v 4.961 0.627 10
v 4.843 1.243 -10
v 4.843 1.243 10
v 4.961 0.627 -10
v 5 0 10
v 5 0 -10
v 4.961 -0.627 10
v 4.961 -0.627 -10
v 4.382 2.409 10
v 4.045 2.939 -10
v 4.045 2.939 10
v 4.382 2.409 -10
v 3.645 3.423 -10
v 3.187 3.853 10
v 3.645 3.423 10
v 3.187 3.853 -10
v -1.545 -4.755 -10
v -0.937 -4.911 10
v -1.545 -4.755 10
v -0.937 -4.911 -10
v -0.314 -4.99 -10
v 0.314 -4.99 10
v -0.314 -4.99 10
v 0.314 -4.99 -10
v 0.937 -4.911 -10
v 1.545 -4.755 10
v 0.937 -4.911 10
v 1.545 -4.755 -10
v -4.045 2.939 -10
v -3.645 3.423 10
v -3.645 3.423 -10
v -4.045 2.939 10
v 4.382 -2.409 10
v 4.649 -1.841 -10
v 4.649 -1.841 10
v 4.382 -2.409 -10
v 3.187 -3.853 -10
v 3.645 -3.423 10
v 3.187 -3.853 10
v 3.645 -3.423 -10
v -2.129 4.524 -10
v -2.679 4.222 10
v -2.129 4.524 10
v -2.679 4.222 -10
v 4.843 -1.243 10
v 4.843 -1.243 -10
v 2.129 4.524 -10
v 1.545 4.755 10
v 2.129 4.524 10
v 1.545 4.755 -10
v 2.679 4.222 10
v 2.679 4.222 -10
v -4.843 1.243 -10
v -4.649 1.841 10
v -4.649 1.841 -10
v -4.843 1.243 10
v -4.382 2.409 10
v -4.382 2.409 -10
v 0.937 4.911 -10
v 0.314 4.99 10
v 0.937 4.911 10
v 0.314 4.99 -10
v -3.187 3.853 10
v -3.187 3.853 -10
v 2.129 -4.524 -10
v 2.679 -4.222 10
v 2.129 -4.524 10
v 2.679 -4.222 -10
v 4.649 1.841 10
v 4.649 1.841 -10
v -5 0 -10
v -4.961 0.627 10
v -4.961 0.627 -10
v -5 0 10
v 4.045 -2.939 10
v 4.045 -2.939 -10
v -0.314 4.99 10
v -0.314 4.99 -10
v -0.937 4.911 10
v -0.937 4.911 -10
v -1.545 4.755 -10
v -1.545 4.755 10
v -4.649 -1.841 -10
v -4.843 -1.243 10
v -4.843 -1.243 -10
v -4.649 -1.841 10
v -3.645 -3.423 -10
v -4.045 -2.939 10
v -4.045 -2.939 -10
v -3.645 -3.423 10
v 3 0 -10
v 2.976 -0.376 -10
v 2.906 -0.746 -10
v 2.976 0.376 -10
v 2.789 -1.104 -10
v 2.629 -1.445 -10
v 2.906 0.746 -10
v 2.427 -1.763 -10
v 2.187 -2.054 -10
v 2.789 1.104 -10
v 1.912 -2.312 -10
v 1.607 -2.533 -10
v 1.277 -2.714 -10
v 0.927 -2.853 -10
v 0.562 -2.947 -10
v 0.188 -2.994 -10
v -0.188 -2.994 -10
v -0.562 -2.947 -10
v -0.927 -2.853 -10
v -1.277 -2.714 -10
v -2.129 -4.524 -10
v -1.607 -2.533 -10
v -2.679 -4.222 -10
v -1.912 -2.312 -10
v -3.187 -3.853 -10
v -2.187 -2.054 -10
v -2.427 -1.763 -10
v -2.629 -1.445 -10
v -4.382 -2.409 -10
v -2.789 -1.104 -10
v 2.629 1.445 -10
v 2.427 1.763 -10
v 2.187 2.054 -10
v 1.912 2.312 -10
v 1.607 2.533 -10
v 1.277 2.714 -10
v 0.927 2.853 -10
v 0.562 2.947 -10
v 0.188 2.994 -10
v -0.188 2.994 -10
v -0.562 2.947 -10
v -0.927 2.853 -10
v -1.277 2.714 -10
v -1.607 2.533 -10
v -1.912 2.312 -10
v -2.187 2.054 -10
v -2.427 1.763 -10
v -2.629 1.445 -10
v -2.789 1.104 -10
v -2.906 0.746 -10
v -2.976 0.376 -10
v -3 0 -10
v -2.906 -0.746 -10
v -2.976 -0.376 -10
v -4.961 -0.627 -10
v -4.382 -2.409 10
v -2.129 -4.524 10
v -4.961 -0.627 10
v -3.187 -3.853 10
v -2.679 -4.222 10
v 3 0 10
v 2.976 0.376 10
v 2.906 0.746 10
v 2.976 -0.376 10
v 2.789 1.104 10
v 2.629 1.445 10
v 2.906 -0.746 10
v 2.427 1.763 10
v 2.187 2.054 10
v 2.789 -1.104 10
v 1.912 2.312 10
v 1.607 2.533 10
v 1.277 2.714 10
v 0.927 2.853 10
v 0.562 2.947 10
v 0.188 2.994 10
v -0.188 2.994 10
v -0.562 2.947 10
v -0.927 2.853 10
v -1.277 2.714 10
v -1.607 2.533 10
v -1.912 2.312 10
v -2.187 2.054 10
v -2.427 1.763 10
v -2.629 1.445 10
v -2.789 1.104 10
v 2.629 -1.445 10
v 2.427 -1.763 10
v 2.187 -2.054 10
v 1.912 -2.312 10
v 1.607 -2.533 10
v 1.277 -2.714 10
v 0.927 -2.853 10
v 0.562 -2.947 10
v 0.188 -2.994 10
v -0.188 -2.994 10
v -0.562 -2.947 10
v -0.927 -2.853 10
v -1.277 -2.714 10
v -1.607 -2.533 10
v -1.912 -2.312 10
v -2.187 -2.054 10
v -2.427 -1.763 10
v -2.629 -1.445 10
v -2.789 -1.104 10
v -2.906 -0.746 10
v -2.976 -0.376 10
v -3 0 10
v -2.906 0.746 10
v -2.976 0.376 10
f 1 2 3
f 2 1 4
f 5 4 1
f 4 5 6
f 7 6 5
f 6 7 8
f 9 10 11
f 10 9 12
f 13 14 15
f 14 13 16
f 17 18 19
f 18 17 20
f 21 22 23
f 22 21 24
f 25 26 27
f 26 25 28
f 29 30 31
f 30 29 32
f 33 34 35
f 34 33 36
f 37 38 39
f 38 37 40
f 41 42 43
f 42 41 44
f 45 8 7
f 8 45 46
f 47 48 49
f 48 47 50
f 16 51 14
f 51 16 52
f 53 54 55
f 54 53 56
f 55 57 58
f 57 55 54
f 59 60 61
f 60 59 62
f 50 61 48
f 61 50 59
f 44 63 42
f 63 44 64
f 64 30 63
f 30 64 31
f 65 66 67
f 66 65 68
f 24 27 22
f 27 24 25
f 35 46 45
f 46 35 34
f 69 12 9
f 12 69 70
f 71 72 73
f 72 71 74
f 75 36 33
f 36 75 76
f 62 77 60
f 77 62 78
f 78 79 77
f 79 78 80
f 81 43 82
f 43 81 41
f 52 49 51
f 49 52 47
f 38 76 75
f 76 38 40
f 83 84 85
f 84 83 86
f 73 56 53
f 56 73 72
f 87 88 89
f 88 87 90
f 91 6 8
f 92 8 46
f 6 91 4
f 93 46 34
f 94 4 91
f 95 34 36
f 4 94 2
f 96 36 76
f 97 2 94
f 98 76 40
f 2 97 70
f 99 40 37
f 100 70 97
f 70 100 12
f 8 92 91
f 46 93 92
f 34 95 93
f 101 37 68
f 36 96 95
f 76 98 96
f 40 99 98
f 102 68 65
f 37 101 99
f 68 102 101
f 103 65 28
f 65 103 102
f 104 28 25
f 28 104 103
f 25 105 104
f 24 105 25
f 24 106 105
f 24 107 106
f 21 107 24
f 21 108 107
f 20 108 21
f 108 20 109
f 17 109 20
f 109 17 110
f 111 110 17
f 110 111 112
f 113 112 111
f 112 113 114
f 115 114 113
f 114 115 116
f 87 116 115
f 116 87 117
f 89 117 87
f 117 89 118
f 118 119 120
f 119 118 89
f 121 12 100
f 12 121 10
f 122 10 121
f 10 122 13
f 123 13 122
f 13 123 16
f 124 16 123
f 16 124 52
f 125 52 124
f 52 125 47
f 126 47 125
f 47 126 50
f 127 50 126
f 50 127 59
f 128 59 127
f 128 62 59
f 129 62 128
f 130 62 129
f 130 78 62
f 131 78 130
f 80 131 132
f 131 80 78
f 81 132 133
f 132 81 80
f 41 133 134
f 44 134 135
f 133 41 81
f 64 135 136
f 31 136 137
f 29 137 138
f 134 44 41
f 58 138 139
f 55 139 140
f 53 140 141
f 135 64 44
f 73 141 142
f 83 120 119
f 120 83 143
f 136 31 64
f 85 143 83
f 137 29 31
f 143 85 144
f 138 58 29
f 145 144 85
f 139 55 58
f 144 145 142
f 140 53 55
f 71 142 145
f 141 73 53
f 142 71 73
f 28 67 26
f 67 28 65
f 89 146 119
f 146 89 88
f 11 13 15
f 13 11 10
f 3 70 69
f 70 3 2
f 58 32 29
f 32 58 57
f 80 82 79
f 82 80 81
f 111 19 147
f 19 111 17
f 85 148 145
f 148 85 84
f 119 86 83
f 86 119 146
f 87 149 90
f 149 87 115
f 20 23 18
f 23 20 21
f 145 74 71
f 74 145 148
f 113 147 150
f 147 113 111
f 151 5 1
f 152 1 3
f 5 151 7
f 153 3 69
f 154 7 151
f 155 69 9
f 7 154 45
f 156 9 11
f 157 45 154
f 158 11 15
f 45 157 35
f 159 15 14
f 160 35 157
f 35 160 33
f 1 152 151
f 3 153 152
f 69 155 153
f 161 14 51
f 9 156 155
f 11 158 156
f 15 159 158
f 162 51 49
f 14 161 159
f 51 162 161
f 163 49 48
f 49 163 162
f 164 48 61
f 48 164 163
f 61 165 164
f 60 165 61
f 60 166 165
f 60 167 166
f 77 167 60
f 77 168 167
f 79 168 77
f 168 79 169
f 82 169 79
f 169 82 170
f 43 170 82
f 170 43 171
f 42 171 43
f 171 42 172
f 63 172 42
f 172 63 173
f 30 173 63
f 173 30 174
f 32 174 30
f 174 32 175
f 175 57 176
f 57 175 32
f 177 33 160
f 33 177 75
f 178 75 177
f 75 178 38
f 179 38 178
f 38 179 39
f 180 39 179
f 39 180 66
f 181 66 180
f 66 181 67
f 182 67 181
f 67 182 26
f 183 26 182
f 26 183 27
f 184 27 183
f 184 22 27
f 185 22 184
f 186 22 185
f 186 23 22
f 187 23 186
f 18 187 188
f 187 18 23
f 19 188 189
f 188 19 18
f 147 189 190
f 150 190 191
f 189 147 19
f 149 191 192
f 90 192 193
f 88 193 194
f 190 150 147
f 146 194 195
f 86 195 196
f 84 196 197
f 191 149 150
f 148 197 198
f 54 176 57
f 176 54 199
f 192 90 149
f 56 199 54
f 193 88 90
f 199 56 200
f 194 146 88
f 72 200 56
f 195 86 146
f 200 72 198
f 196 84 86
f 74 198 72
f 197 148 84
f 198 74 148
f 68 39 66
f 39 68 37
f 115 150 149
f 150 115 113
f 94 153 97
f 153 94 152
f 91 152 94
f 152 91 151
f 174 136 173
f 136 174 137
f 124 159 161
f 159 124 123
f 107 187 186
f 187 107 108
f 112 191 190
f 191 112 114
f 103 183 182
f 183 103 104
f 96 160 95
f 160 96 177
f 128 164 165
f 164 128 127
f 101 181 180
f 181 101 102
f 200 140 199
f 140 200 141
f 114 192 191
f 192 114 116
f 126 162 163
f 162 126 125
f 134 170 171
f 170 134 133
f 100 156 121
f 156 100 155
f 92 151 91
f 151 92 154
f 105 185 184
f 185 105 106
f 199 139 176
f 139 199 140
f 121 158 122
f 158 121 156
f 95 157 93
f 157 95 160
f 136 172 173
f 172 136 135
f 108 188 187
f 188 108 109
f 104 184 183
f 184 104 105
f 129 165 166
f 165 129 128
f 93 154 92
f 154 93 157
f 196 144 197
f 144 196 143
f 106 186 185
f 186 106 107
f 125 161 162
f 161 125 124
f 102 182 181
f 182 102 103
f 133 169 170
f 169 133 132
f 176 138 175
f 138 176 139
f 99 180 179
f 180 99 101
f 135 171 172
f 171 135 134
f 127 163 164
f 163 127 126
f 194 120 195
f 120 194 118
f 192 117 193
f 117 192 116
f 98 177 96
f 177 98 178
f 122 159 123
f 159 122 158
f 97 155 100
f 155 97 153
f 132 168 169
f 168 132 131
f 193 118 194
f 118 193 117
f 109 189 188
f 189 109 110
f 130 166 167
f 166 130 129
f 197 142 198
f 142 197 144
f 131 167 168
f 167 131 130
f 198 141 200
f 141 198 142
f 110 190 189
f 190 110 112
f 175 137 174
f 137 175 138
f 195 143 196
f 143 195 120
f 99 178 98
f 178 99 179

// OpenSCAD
$fn = 50;


difference() {
	union() {
		translate(v = [0, 0, -10.0000000000]) {
			cylinder(h = 20, r = 5.0000000000);
		}
	}
	union() {
		translate(v = [0, 0, -100.0000000000]) {
			cylinder(h = 200, r = 3.0000000000);
		}
	}
}
